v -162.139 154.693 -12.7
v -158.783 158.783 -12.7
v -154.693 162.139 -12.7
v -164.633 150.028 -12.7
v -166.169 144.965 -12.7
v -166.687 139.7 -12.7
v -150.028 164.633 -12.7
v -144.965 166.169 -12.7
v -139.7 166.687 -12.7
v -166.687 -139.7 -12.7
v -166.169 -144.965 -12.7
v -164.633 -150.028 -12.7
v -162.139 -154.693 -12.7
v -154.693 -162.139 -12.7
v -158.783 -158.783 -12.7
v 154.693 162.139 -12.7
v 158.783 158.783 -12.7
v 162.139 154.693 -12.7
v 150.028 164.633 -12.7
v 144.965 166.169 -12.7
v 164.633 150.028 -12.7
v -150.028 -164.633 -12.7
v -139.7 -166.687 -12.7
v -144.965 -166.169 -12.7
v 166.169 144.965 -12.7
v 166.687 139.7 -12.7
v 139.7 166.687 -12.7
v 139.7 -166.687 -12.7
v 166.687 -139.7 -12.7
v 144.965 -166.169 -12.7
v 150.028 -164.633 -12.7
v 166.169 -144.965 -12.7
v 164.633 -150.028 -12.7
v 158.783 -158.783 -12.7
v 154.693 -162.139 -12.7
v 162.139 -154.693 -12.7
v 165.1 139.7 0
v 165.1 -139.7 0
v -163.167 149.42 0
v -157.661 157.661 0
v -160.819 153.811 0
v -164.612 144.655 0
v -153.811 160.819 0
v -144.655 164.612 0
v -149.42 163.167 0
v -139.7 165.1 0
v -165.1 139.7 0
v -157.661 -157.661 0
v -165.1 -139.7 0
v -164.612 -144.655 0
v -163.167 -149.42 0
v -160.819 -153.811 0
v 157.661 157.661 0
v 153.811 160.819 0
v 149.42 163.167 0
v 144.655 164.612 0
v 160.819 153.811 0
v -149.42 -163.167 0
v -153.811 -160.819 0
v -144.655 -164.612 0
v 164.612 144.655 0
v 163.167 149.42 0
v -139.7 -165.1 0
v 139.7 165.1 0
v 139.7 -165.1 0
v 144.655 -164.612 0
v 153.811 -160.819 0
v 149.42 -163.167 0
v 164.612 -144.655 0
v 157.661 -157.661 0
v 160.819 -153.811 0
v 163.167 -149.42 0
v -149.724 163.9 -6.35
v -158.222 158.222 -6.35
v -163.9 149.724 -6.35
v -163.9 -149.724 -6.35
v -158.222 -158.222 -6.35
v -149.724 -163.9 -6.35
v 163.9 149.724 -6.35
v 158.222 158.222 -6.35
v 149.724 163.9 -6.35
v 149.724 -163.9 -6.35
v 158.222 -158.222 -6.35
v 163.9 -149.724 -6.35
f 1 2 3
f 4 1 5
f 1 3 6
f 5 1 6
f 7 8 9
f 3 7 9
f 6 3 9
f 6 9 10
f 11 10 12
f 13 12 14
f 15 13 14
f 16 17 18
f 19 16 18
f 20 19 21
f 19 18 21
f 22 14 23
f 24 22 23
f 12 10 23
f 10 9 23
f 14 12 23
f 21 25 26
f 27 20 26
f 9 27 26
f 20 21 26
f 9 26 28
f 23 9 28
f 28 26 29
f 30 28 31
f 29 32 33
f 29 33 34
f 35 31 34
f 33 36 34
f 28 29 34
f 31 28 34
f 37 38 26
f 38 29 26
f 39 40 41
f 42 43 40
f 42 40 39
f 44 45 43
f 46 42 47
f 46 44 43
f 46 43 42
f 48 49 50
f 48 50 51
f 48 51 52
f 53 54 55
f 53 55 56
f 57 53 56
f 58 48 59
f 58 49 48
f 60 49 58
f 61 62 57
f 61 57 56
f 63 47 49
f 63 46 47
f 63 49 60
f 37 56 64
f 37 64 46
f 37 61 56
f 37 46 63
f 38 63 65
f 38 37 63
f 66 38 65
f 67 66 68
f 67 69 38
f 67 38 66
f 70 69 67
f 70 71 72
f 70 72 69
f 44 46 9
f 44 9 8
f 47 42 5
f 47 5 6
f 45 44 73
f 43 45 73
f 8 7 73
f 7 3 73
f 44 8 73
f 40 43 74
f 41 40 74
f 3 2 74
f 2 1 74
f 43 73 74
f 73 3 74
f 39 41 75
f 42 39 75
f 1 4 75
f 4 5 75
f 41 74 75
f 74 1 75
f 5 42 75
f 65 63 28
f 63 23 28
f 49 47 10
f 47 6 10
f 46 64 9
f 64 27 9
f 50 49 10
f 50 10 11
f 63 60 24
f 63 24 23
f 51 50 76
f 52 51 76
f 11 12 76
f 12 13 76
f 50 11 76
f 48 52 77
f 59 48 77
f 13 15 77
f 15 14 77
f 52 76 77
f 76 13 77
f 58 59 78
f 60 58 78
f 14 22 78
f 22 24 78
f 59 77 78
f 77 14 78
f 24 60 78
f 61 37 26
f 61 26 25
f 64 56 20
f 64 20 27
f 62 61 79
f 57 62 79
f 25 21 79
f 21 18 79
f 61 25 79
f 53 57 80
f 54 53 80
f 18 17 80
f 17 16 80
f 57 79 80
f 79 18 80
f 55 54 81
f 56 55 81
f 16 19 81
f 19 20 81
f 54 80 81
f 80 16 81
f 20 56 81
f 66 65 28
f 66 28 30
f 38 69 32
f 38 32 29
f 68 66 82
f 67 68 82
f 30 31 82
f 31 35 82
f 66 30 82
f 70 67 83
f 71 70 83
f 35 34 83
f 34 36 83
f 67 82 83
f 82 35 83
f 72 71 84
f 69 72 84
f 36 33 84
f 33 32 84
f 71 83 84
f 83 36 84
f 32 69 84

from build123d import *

# Parameters (mm, degrees)
F2_DEPTH = 12.7
F2_TAPER = -7.125


with BuildPart() as f2:
    # F0 (on Top) → F2 (new body)
    with BuildSketch(Plane.XY):
        with BuildLine():
            Line((-139.7, -165.1), (139.7, -165.1))
            ThreePointArc((139.7, -165.1), (157.6605122421, -157.6605122421), (165.1, -139.7))
            Line((165.1, -139.7), (165.1, 139.7))
            ThreePointArc((165.1, 139.7), (157.6605122421, 157.6605122421), (139.7, 165.1))
            Line((139.7, 165.1), (-139.7, 165.1))
            ThreePointArc((-139.7, 165.1), (-157.6605122421, 157.6605122421), (-165.1, 139.7))
            Line((-165.1, 139.7), (-165.1, -139.7))
            ThreePointArc((-165.1, -139.7), (-157.6605122421, -157.6605122421), (-139.7, -165.1))
        make_face()
        with BuildLine():
            ThreePointArc((-139.7, -152.4), (-148.6802561211, -148.6802561211), (-152.4, -139.7))
            Line((-152.4, -139.7), (-152.4, -19.0555986124))
            ThreePointArc((-152.4, -19.0555986124), (-148.6802561211, -10.0753424913), (-139.7, -6.3555986124))
            Line((-139.7, -6.3555986124), (-19.0451302115, -6.3555986124))
            ThreePointArc((-19.0451302115, -6.3555986124), (-10.0648740904, -10.0753424913), (-6.3451302115, -19.0555986124))
            Line((-6.3451302115, -19.0555986124), (-6.3451302115, -139.7))
            ThreePointArc((-6.3451302115, -139.7), (-10.0648740904, -148.6802561211), (-19.0451302115, -152.4))
            Line((-19.0451302115, -152.4), (-139.7, -152.4))
        make_face(mode=Mode.SUBTRACT)
        with BuildLine():
            ThreePointArc((152.4, -139.7), (148.6802561211, -148.6802561211), (139.7, -152.4))
            Line((139.7, -152.4), (19.0451302115, -152.4))
            ThreePointArc((19.0451302115, -152.4), (10.0648740904, -148.6802561211), (6.3451302115, -139.7))
            Line((6.3451302115, -139.7), (6.3451302115, -19.0555986124))
            ThreePointArc((6.3451302115, -19.0555986124), (10.0648740904, -10.0753424913), (19.0451302115, -6.3555986124))
            Line((19.0451302115, -6.3555986124), (139.7, -6.3555986124))
            ThreePointArc((139.7, -6.3555986124), (148.6802561211, -10.0753424913), (152.4, -19.0555986124))
            Line((152.4, -19.0555986124), (152.4, -139.7))
        make_face(mode=Mode.SUBTRACT)
        with BuildLine():
            ThreePointArc((-152.4, 139.7), (-148.6802561211, 148.6802561211), (-139.7, 152.4))
            Line((-139.7, 152.4), (-19.0451302115, 152.4))
            ThreePointArc((-19.0451302115, 152.4), (-10.0648740904, 148.6802561211), (-6.3451302115, 139.7))
            Line((-6.3451302115, 139.7), (-6.3451302115, 19.0555986124))
            ThreePointArc((-6.3451302115, 19.0555986124), (-10.0648740904, 10.0753424913), (-19.0451302115, 6.3555986124))
            Line((-19.0451302115, 6.3555986124), (-139.7, 6.3555986124))
            ThreePointArc((-139.7, 6.3555986124), (-148.6802561211, 10.0753424913), (-152.4, 19.0555986124))
            Line((-152.4, 19.0555986124), (-152.4, 139.7))
        make_face(mode=Mode.SUBTRACT)
        with BuildLine():
            Line((19.0451302115, 152.4), (139.7, 152.4))
            ThreePointArc((139.7, 152.4), (148.6802561211, 148.6802561211), (152.4, 139.7))
            Line((152.4, 139.7), (152.4, 19.0555986124))
            ThreePointArc((152.4, 19.0555986124), (148.6802561211, 10.0753424913), (139.7, 6.3555986124))
            Line((139.7, 6.3555986124), (19.0451302115, 6.3555986124))
            ThreePointArc((19.0451302115, 6.3555986124), (10.0648740904, 10.0753424913), (6.3451302115, 19.0555986124))
            Line((6.3451302115, 19.0555986124), (6.3451302115, 139.7))
            ThreePointArc((6.3451302115, 139.7), (10.0648740904, 148.6802561211), (19.0451302115, 152.4))
        make_face(mode=Mode.SUBTRACT)
        with BuildLine():
            Line((19.0451302115, -152.4), (139.7, -152.4))
            ThreePointArc((139.7, -152.4), (148.6802561211, -148.6802561211), (152.4, -139.7))
            Line((152.4, -139.7), (152.4, -19.0555986124))
            ThreePointArc((152.4, -19.0555986124), (148.6802561211, -10.0753424913), (139.7, -6.3555986124))
            Line((139.7, -6.3555986124), (19.0451302115, -6.3555986124))
            ThreePointArc((19.0451302115, -6.3555986124), (10.0648740904, -10.0753424913), (6.3451302115, -19.0555986124))
            Line((6.3451302115, -19.0555986124), (6.3451302115, -139.7))
            ThreePointArc((6.3451302115, -139.7), (10.0648740904, -148.6802561211), (19.0451302115, -152.4))
        make_face()
        with BuildLine():
            ThreePointArc((152.4, 139.7), (148.6802561211, 148.6802561211), (139.7, 152.4))
            Line((139.7, 152.4), (19.0451302115, 152.4))
            ThreePointArc((19.0451302115, 152.4), (10.0648740904, 148.6802561211), (6.3451302115, 139.7))
            Line((6.3451302115, 139.7), (6.3451302115, 19.0555986124))
            ThreePointArc((6.3451302115, 19.0555986124), (10.0648740904, 10.0753424913), (19.0451302115, 6.3555986124))
            Line((19.0451302115, 6.3555986124), (139.7, 6.3555986124))
            ThreePointArc((139.7, 6.3555986124), (148.6802561211, 10.0753424913), (152.4, 19.0555986124))
            Line((152.4, 19.0555986124), (152.4, 139.7))
        make_face()
        with BuildLine():
            Line((-152.4, -19.0555986124), (-152.4, -139.7))
            ThreePointArc((-152.4, -139.7), (-148.6802561211, -148.6802561211), (-139.7, -152.4))
            Line((-139.7, -152.4), (-19.0451302115, -152.4))
            ThreePointArc((-19.0451302115, -152.4), (-10.0648740904, -148.6802561211), (-6.3451302115, -139.7))
            Line((-6.3451302115, -139.7), (-6.3451302115, -19.0555986124))
            ThreePointArc((-6.3451302115, -19.0555986124), (-10.0648740904, -10.0753424913), (-19.0451302115, -6.3555986124))
            Line((-19.0451302115, -6.3555986124), (-139.7, -6.3555986124))
            ThreePointArc((-139.7, -6.3555986124), (-148.6802561211, -10.0753424913), (-152.4, -19.0555986124))
        make_face()
        with BuildLine():
            Line((-19.0451302115, 152.4), (-139.7, 152.4))
            ThreePointArc((-139.7, 152.4), (-148.6802561211, 148.6802561211), (-152.4, 139.7))
            Line((-152.4, 139.7), (-152.4, 19.0555986124))
            ThreePointArc((-152.4, 19.0555986124), (-148.6802561211, 10.0753424913), (-139.7, 6.3555986124))
            Line((-139.7, 6.3555986124), (-19.0451302115, 6.3555986124))
            ThreePointArc((-19.0451302115, 6.3555986124), (-10.0648740904, 10.0753424913), (-6.3451302115, 19.0555986124))
            Line((-6.3451302115, 19.0555986124), (-6.3451302115, 139.7))
            ThreePointArc((-6.3451302115, 139.7), (-10.0648740904, 148.6802561211), (-19.0451302115, 152.4))
        make_face()
    extrude(amount=-F2_DEPTH, taper=F2_TAPER)


solid = f2.part
